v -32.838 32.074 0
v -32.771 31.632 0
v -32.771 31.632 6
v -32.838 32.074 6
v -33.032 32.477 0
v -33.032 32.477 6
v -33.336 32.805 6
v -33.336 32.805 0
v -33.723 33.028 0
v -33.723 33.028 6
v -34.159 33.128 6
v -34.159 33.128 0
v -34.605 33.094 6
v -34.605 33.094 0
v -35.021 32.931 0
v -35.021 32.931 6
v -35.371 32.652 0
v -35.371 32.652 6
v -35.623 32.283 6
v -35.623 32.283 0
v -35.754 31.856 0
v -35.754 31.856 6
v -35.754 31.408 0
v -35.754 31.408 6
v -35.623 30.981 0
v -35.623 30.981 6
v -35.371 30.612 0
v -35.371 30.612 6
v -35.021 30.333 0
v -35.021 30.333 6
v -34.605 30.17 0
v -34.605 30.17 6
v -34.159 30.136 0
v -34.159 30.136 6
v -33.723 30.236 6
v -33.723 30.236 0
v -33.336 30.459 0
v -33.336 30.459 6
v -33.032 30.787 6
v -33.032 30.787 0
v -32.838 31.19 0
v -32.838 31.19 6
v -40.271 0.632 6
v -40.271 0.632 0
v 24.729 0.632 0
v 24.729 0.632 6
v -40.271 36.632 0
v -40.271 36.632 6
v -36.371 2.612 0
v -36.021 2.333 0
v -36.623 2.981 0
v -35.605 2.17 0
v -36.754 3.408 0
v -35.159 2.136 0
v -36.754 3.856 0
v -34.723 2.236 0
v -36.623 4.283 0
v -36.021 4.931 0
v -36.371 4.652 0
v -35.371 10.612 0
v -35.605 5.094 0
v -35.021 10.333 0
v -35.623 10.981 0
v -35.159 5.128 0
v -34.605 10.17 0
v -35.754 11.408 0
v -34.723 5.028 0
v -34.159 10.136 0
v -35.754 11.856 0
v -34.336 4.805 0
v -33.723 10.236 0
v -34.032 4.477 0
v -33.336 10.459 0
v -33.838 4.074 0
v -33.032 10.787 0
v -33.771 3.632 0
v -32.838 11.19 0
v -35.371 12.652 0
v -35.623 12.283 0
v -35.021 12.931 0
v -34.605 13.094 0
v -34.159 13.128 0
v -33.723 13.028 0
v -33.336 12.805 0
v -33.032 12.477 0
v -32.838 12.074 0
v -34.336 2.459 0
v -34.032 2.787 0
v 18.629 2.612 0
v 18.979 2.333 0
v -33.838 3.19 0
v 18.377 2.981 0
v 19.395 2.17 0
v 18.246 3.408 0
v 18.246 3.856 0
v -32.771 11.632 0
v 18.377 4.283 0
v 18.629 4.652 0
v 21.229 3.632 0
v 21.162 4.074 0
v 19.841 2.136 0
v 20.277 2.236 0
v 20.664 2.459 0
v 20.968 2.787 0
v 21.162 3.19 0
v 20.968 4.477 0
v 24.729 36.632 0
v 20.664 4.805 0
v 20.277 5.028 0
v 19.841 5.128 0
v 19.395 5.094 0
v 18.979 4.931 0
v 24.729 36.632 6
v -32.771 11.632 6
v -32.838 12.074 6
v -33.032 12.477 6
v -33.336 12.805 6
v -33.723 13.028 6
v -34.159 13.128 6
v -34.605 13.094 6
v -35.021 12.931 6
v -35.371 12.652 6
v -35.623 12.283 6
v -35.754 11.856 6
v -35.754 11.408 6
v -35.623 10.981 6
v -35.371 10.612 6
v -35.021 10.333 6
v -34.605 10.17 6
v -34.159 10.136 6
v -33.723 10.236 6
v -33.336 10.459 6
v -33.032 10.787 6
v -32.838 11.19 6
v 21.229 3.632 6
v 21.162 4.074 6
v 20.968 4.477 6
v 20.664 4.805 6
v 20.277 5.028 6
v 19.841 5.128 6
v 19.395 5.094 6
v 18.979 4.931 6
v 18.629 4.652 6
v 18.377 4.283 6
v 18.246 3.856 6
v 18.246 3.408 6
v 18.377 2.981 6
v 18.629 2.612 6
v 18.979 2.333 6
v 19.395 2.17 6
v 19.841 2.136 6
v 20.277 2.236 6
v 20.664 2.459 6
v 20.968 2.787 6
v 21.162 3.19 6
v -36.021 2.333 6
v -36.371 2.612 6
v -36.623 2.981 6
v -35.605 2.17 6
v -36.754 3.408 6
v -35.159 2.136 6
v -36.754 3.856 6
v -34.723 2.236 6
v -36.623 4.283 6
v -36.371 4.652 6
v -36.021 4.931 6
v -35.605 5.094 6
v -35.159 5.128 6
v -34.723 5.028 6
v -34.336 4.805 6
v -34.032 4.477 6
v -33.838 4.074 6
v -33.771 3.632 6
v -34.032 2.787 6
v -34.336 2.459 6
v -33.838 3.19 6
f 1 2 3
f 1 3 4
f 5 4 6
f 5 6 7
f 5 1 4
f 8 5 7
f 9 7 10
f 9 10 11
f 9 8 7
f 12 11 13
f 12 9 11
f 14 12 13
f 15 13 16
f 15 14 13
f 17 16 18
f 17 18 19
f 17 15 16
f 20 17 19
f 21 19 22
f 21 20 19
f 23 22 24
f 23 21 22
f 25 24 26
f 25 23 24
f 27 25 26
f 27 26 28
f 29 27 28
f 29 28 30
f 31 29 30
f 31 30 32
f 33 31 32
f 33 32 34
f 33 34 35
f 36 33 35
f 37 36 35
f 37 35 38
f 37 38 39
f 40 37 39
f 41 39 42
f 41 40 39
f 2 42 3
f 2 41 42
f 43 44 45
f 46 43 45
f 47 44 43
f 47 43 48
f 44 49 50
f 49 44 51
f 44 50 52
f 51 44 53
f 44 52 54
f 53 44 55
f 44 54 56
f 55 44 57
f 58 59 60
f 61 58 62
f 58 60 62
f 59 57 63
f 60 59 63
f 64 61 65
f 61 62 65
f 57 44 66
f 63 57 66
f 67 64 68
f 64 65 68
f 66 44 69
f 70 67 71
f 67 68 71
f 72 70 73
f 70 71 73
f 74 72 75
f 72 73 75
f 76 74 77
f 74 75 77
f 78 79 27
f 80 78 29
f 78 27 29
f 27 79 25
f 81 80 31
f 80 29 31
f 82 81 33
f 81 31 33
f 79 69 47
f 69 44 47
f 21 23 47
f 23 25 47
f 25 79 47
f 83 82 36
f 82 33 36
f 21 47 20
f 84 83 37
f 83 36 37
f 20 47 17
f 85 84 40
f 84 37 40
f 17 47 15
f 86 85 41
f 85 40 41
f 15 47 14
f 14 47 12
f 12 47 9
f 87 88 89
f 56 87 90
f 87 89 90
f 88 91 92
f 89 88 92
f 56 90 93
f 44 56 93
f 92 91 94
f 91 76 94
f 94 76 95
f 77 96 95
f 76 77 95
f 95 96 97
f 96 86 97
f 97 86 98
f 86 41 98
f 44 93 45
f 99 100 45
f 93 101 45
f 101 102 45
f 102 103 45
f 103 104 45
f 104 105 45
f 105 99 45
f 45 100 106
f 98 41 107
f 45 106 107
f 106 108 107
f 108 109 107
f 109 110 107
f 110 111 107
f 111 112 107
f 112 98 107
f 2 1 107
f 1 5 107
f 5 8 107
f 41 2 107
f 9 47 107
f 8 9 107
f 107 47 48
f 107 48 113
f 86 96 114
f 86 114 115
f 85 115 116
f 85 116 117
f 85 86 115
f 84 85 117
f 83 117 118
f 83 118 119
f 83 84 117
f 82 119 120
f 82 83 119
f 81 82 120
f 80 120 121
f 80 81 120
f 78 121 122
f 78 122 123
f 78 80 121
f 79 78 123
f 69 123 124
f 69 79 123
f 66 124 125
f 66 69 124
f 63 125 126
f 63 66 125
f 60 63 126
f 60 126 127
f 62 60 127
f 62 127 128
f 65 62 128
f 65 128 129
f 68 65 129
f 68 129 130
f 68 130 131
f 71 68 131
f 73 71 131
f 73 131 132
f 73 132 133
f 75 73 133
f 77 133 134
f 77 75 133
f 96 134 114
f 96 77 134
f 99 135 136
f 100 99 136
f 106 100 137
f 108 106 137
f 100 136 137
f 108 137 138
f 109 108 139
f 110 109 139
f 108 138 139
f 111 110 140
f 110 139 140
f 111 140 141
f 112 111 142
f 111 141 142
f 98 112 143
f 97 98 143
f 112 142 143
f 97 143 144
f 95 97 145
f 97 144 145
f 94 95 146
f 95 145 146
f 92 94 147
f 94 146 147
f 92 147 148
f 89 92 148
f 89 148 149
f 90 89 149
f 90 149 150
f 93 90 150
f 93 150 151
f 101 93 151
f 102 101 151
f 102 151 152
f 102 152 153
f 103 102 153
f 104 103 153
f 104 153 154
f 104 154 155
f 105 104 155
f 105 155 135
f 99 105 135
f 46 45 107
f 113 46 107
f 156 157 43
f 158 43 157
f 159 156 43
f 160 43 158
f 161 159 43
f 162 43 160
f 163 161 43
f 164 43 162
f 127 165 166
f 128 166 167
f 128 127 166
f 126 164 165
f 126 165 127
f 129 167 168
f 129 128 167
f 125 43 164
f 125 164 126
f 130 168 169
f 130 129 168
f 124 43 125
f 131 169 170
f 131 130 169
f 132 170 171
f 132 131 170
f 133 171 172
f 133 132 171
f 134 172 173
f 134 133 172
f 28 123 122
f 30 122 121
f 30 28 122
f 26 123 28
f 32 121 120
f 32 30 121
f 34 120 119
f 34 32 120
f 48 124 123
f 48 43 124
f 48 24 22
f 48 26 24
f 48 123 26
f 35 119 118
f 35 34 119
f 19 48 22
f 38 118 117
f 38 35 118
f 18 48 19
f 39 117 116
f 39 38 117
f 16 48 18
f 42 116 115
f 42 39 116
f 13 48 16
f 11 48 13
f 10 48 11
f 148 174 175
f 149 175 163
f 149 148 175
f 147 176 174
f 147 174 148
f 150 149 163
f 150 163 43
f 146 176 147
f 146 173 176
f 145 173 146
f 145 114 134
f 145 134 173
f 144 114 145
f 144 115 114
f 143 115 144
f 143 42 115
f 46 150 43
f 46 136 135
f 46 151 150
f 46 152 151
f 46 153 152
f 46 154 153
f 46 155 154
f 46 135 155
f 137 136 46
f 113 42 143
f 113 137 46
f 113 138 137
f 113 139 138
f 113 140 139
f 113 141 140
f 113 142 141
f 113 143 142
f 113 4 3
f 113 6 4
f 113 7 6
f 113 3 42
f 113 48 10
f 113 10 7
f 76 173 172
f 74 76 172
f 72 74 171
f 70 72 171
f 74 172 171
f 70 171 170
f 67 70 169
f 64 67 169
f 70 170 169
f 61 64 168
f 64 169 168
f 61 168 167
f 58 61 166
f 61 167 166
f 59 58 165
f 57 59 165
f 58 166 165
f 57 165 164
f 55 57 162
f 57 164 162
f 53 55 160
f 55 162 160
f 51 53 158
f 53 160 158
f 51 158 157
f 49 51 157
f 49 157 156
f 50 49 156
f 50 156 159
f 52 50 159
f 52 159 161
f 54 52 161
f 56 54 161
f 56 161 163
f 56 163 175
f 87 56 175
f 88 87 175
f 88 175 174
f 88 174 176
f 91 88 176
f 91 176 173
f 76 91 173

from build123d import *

# Parameters (mm, degrees)
ESQUISSE1_W             = 65
ESQUISSE1_H             = 36
ESQUISSE1_R             = 1.5
BOSS_EXTRU_1_DEPTH      = 6
ESQUISSE3_R             = 1.5
ENL_V_MAT_EXTRU_1_DEPTH = 10


with BuildPart() as part:
    # Esquisse1 → Boss.-Extru.1 (new body)
    with BuildSketch(Plane.XY):
        with Locations((-7.771220945, 18.631944444)):
            Rectangle(ESQUISSE1_W, ESQUISSE1_H)
        with Locations((-34.271220945, 31.631944444)):
            Circle(ESQUISSE1_R, mode=Mode.SUBTRACT)
        with Locations((-34.271220945, 11.631944444)):
            Circle(ESQUISSE1_R, mode=Mode.SUBTRACT)
    extrude(amount=BOSS_EXTRU_1_DEPTH)

    # Esquisse3 → Enlèv. mat.-Extru.1 (cut)
    with BuildSketch(Plane.XY.offset(6)):
        with Locations((-35.271220945, 3.631944444)):
            Circle(ESQUISSE3_R)
        with Locations((19.728779055, 3.631944444)):
            Circle(ESQUISSE3_R)
    extrude(amount=-ENL_V_MAT_EXTRU_1_DEPTH, mode=Mode.SUBTRACT)


solid = part.part
